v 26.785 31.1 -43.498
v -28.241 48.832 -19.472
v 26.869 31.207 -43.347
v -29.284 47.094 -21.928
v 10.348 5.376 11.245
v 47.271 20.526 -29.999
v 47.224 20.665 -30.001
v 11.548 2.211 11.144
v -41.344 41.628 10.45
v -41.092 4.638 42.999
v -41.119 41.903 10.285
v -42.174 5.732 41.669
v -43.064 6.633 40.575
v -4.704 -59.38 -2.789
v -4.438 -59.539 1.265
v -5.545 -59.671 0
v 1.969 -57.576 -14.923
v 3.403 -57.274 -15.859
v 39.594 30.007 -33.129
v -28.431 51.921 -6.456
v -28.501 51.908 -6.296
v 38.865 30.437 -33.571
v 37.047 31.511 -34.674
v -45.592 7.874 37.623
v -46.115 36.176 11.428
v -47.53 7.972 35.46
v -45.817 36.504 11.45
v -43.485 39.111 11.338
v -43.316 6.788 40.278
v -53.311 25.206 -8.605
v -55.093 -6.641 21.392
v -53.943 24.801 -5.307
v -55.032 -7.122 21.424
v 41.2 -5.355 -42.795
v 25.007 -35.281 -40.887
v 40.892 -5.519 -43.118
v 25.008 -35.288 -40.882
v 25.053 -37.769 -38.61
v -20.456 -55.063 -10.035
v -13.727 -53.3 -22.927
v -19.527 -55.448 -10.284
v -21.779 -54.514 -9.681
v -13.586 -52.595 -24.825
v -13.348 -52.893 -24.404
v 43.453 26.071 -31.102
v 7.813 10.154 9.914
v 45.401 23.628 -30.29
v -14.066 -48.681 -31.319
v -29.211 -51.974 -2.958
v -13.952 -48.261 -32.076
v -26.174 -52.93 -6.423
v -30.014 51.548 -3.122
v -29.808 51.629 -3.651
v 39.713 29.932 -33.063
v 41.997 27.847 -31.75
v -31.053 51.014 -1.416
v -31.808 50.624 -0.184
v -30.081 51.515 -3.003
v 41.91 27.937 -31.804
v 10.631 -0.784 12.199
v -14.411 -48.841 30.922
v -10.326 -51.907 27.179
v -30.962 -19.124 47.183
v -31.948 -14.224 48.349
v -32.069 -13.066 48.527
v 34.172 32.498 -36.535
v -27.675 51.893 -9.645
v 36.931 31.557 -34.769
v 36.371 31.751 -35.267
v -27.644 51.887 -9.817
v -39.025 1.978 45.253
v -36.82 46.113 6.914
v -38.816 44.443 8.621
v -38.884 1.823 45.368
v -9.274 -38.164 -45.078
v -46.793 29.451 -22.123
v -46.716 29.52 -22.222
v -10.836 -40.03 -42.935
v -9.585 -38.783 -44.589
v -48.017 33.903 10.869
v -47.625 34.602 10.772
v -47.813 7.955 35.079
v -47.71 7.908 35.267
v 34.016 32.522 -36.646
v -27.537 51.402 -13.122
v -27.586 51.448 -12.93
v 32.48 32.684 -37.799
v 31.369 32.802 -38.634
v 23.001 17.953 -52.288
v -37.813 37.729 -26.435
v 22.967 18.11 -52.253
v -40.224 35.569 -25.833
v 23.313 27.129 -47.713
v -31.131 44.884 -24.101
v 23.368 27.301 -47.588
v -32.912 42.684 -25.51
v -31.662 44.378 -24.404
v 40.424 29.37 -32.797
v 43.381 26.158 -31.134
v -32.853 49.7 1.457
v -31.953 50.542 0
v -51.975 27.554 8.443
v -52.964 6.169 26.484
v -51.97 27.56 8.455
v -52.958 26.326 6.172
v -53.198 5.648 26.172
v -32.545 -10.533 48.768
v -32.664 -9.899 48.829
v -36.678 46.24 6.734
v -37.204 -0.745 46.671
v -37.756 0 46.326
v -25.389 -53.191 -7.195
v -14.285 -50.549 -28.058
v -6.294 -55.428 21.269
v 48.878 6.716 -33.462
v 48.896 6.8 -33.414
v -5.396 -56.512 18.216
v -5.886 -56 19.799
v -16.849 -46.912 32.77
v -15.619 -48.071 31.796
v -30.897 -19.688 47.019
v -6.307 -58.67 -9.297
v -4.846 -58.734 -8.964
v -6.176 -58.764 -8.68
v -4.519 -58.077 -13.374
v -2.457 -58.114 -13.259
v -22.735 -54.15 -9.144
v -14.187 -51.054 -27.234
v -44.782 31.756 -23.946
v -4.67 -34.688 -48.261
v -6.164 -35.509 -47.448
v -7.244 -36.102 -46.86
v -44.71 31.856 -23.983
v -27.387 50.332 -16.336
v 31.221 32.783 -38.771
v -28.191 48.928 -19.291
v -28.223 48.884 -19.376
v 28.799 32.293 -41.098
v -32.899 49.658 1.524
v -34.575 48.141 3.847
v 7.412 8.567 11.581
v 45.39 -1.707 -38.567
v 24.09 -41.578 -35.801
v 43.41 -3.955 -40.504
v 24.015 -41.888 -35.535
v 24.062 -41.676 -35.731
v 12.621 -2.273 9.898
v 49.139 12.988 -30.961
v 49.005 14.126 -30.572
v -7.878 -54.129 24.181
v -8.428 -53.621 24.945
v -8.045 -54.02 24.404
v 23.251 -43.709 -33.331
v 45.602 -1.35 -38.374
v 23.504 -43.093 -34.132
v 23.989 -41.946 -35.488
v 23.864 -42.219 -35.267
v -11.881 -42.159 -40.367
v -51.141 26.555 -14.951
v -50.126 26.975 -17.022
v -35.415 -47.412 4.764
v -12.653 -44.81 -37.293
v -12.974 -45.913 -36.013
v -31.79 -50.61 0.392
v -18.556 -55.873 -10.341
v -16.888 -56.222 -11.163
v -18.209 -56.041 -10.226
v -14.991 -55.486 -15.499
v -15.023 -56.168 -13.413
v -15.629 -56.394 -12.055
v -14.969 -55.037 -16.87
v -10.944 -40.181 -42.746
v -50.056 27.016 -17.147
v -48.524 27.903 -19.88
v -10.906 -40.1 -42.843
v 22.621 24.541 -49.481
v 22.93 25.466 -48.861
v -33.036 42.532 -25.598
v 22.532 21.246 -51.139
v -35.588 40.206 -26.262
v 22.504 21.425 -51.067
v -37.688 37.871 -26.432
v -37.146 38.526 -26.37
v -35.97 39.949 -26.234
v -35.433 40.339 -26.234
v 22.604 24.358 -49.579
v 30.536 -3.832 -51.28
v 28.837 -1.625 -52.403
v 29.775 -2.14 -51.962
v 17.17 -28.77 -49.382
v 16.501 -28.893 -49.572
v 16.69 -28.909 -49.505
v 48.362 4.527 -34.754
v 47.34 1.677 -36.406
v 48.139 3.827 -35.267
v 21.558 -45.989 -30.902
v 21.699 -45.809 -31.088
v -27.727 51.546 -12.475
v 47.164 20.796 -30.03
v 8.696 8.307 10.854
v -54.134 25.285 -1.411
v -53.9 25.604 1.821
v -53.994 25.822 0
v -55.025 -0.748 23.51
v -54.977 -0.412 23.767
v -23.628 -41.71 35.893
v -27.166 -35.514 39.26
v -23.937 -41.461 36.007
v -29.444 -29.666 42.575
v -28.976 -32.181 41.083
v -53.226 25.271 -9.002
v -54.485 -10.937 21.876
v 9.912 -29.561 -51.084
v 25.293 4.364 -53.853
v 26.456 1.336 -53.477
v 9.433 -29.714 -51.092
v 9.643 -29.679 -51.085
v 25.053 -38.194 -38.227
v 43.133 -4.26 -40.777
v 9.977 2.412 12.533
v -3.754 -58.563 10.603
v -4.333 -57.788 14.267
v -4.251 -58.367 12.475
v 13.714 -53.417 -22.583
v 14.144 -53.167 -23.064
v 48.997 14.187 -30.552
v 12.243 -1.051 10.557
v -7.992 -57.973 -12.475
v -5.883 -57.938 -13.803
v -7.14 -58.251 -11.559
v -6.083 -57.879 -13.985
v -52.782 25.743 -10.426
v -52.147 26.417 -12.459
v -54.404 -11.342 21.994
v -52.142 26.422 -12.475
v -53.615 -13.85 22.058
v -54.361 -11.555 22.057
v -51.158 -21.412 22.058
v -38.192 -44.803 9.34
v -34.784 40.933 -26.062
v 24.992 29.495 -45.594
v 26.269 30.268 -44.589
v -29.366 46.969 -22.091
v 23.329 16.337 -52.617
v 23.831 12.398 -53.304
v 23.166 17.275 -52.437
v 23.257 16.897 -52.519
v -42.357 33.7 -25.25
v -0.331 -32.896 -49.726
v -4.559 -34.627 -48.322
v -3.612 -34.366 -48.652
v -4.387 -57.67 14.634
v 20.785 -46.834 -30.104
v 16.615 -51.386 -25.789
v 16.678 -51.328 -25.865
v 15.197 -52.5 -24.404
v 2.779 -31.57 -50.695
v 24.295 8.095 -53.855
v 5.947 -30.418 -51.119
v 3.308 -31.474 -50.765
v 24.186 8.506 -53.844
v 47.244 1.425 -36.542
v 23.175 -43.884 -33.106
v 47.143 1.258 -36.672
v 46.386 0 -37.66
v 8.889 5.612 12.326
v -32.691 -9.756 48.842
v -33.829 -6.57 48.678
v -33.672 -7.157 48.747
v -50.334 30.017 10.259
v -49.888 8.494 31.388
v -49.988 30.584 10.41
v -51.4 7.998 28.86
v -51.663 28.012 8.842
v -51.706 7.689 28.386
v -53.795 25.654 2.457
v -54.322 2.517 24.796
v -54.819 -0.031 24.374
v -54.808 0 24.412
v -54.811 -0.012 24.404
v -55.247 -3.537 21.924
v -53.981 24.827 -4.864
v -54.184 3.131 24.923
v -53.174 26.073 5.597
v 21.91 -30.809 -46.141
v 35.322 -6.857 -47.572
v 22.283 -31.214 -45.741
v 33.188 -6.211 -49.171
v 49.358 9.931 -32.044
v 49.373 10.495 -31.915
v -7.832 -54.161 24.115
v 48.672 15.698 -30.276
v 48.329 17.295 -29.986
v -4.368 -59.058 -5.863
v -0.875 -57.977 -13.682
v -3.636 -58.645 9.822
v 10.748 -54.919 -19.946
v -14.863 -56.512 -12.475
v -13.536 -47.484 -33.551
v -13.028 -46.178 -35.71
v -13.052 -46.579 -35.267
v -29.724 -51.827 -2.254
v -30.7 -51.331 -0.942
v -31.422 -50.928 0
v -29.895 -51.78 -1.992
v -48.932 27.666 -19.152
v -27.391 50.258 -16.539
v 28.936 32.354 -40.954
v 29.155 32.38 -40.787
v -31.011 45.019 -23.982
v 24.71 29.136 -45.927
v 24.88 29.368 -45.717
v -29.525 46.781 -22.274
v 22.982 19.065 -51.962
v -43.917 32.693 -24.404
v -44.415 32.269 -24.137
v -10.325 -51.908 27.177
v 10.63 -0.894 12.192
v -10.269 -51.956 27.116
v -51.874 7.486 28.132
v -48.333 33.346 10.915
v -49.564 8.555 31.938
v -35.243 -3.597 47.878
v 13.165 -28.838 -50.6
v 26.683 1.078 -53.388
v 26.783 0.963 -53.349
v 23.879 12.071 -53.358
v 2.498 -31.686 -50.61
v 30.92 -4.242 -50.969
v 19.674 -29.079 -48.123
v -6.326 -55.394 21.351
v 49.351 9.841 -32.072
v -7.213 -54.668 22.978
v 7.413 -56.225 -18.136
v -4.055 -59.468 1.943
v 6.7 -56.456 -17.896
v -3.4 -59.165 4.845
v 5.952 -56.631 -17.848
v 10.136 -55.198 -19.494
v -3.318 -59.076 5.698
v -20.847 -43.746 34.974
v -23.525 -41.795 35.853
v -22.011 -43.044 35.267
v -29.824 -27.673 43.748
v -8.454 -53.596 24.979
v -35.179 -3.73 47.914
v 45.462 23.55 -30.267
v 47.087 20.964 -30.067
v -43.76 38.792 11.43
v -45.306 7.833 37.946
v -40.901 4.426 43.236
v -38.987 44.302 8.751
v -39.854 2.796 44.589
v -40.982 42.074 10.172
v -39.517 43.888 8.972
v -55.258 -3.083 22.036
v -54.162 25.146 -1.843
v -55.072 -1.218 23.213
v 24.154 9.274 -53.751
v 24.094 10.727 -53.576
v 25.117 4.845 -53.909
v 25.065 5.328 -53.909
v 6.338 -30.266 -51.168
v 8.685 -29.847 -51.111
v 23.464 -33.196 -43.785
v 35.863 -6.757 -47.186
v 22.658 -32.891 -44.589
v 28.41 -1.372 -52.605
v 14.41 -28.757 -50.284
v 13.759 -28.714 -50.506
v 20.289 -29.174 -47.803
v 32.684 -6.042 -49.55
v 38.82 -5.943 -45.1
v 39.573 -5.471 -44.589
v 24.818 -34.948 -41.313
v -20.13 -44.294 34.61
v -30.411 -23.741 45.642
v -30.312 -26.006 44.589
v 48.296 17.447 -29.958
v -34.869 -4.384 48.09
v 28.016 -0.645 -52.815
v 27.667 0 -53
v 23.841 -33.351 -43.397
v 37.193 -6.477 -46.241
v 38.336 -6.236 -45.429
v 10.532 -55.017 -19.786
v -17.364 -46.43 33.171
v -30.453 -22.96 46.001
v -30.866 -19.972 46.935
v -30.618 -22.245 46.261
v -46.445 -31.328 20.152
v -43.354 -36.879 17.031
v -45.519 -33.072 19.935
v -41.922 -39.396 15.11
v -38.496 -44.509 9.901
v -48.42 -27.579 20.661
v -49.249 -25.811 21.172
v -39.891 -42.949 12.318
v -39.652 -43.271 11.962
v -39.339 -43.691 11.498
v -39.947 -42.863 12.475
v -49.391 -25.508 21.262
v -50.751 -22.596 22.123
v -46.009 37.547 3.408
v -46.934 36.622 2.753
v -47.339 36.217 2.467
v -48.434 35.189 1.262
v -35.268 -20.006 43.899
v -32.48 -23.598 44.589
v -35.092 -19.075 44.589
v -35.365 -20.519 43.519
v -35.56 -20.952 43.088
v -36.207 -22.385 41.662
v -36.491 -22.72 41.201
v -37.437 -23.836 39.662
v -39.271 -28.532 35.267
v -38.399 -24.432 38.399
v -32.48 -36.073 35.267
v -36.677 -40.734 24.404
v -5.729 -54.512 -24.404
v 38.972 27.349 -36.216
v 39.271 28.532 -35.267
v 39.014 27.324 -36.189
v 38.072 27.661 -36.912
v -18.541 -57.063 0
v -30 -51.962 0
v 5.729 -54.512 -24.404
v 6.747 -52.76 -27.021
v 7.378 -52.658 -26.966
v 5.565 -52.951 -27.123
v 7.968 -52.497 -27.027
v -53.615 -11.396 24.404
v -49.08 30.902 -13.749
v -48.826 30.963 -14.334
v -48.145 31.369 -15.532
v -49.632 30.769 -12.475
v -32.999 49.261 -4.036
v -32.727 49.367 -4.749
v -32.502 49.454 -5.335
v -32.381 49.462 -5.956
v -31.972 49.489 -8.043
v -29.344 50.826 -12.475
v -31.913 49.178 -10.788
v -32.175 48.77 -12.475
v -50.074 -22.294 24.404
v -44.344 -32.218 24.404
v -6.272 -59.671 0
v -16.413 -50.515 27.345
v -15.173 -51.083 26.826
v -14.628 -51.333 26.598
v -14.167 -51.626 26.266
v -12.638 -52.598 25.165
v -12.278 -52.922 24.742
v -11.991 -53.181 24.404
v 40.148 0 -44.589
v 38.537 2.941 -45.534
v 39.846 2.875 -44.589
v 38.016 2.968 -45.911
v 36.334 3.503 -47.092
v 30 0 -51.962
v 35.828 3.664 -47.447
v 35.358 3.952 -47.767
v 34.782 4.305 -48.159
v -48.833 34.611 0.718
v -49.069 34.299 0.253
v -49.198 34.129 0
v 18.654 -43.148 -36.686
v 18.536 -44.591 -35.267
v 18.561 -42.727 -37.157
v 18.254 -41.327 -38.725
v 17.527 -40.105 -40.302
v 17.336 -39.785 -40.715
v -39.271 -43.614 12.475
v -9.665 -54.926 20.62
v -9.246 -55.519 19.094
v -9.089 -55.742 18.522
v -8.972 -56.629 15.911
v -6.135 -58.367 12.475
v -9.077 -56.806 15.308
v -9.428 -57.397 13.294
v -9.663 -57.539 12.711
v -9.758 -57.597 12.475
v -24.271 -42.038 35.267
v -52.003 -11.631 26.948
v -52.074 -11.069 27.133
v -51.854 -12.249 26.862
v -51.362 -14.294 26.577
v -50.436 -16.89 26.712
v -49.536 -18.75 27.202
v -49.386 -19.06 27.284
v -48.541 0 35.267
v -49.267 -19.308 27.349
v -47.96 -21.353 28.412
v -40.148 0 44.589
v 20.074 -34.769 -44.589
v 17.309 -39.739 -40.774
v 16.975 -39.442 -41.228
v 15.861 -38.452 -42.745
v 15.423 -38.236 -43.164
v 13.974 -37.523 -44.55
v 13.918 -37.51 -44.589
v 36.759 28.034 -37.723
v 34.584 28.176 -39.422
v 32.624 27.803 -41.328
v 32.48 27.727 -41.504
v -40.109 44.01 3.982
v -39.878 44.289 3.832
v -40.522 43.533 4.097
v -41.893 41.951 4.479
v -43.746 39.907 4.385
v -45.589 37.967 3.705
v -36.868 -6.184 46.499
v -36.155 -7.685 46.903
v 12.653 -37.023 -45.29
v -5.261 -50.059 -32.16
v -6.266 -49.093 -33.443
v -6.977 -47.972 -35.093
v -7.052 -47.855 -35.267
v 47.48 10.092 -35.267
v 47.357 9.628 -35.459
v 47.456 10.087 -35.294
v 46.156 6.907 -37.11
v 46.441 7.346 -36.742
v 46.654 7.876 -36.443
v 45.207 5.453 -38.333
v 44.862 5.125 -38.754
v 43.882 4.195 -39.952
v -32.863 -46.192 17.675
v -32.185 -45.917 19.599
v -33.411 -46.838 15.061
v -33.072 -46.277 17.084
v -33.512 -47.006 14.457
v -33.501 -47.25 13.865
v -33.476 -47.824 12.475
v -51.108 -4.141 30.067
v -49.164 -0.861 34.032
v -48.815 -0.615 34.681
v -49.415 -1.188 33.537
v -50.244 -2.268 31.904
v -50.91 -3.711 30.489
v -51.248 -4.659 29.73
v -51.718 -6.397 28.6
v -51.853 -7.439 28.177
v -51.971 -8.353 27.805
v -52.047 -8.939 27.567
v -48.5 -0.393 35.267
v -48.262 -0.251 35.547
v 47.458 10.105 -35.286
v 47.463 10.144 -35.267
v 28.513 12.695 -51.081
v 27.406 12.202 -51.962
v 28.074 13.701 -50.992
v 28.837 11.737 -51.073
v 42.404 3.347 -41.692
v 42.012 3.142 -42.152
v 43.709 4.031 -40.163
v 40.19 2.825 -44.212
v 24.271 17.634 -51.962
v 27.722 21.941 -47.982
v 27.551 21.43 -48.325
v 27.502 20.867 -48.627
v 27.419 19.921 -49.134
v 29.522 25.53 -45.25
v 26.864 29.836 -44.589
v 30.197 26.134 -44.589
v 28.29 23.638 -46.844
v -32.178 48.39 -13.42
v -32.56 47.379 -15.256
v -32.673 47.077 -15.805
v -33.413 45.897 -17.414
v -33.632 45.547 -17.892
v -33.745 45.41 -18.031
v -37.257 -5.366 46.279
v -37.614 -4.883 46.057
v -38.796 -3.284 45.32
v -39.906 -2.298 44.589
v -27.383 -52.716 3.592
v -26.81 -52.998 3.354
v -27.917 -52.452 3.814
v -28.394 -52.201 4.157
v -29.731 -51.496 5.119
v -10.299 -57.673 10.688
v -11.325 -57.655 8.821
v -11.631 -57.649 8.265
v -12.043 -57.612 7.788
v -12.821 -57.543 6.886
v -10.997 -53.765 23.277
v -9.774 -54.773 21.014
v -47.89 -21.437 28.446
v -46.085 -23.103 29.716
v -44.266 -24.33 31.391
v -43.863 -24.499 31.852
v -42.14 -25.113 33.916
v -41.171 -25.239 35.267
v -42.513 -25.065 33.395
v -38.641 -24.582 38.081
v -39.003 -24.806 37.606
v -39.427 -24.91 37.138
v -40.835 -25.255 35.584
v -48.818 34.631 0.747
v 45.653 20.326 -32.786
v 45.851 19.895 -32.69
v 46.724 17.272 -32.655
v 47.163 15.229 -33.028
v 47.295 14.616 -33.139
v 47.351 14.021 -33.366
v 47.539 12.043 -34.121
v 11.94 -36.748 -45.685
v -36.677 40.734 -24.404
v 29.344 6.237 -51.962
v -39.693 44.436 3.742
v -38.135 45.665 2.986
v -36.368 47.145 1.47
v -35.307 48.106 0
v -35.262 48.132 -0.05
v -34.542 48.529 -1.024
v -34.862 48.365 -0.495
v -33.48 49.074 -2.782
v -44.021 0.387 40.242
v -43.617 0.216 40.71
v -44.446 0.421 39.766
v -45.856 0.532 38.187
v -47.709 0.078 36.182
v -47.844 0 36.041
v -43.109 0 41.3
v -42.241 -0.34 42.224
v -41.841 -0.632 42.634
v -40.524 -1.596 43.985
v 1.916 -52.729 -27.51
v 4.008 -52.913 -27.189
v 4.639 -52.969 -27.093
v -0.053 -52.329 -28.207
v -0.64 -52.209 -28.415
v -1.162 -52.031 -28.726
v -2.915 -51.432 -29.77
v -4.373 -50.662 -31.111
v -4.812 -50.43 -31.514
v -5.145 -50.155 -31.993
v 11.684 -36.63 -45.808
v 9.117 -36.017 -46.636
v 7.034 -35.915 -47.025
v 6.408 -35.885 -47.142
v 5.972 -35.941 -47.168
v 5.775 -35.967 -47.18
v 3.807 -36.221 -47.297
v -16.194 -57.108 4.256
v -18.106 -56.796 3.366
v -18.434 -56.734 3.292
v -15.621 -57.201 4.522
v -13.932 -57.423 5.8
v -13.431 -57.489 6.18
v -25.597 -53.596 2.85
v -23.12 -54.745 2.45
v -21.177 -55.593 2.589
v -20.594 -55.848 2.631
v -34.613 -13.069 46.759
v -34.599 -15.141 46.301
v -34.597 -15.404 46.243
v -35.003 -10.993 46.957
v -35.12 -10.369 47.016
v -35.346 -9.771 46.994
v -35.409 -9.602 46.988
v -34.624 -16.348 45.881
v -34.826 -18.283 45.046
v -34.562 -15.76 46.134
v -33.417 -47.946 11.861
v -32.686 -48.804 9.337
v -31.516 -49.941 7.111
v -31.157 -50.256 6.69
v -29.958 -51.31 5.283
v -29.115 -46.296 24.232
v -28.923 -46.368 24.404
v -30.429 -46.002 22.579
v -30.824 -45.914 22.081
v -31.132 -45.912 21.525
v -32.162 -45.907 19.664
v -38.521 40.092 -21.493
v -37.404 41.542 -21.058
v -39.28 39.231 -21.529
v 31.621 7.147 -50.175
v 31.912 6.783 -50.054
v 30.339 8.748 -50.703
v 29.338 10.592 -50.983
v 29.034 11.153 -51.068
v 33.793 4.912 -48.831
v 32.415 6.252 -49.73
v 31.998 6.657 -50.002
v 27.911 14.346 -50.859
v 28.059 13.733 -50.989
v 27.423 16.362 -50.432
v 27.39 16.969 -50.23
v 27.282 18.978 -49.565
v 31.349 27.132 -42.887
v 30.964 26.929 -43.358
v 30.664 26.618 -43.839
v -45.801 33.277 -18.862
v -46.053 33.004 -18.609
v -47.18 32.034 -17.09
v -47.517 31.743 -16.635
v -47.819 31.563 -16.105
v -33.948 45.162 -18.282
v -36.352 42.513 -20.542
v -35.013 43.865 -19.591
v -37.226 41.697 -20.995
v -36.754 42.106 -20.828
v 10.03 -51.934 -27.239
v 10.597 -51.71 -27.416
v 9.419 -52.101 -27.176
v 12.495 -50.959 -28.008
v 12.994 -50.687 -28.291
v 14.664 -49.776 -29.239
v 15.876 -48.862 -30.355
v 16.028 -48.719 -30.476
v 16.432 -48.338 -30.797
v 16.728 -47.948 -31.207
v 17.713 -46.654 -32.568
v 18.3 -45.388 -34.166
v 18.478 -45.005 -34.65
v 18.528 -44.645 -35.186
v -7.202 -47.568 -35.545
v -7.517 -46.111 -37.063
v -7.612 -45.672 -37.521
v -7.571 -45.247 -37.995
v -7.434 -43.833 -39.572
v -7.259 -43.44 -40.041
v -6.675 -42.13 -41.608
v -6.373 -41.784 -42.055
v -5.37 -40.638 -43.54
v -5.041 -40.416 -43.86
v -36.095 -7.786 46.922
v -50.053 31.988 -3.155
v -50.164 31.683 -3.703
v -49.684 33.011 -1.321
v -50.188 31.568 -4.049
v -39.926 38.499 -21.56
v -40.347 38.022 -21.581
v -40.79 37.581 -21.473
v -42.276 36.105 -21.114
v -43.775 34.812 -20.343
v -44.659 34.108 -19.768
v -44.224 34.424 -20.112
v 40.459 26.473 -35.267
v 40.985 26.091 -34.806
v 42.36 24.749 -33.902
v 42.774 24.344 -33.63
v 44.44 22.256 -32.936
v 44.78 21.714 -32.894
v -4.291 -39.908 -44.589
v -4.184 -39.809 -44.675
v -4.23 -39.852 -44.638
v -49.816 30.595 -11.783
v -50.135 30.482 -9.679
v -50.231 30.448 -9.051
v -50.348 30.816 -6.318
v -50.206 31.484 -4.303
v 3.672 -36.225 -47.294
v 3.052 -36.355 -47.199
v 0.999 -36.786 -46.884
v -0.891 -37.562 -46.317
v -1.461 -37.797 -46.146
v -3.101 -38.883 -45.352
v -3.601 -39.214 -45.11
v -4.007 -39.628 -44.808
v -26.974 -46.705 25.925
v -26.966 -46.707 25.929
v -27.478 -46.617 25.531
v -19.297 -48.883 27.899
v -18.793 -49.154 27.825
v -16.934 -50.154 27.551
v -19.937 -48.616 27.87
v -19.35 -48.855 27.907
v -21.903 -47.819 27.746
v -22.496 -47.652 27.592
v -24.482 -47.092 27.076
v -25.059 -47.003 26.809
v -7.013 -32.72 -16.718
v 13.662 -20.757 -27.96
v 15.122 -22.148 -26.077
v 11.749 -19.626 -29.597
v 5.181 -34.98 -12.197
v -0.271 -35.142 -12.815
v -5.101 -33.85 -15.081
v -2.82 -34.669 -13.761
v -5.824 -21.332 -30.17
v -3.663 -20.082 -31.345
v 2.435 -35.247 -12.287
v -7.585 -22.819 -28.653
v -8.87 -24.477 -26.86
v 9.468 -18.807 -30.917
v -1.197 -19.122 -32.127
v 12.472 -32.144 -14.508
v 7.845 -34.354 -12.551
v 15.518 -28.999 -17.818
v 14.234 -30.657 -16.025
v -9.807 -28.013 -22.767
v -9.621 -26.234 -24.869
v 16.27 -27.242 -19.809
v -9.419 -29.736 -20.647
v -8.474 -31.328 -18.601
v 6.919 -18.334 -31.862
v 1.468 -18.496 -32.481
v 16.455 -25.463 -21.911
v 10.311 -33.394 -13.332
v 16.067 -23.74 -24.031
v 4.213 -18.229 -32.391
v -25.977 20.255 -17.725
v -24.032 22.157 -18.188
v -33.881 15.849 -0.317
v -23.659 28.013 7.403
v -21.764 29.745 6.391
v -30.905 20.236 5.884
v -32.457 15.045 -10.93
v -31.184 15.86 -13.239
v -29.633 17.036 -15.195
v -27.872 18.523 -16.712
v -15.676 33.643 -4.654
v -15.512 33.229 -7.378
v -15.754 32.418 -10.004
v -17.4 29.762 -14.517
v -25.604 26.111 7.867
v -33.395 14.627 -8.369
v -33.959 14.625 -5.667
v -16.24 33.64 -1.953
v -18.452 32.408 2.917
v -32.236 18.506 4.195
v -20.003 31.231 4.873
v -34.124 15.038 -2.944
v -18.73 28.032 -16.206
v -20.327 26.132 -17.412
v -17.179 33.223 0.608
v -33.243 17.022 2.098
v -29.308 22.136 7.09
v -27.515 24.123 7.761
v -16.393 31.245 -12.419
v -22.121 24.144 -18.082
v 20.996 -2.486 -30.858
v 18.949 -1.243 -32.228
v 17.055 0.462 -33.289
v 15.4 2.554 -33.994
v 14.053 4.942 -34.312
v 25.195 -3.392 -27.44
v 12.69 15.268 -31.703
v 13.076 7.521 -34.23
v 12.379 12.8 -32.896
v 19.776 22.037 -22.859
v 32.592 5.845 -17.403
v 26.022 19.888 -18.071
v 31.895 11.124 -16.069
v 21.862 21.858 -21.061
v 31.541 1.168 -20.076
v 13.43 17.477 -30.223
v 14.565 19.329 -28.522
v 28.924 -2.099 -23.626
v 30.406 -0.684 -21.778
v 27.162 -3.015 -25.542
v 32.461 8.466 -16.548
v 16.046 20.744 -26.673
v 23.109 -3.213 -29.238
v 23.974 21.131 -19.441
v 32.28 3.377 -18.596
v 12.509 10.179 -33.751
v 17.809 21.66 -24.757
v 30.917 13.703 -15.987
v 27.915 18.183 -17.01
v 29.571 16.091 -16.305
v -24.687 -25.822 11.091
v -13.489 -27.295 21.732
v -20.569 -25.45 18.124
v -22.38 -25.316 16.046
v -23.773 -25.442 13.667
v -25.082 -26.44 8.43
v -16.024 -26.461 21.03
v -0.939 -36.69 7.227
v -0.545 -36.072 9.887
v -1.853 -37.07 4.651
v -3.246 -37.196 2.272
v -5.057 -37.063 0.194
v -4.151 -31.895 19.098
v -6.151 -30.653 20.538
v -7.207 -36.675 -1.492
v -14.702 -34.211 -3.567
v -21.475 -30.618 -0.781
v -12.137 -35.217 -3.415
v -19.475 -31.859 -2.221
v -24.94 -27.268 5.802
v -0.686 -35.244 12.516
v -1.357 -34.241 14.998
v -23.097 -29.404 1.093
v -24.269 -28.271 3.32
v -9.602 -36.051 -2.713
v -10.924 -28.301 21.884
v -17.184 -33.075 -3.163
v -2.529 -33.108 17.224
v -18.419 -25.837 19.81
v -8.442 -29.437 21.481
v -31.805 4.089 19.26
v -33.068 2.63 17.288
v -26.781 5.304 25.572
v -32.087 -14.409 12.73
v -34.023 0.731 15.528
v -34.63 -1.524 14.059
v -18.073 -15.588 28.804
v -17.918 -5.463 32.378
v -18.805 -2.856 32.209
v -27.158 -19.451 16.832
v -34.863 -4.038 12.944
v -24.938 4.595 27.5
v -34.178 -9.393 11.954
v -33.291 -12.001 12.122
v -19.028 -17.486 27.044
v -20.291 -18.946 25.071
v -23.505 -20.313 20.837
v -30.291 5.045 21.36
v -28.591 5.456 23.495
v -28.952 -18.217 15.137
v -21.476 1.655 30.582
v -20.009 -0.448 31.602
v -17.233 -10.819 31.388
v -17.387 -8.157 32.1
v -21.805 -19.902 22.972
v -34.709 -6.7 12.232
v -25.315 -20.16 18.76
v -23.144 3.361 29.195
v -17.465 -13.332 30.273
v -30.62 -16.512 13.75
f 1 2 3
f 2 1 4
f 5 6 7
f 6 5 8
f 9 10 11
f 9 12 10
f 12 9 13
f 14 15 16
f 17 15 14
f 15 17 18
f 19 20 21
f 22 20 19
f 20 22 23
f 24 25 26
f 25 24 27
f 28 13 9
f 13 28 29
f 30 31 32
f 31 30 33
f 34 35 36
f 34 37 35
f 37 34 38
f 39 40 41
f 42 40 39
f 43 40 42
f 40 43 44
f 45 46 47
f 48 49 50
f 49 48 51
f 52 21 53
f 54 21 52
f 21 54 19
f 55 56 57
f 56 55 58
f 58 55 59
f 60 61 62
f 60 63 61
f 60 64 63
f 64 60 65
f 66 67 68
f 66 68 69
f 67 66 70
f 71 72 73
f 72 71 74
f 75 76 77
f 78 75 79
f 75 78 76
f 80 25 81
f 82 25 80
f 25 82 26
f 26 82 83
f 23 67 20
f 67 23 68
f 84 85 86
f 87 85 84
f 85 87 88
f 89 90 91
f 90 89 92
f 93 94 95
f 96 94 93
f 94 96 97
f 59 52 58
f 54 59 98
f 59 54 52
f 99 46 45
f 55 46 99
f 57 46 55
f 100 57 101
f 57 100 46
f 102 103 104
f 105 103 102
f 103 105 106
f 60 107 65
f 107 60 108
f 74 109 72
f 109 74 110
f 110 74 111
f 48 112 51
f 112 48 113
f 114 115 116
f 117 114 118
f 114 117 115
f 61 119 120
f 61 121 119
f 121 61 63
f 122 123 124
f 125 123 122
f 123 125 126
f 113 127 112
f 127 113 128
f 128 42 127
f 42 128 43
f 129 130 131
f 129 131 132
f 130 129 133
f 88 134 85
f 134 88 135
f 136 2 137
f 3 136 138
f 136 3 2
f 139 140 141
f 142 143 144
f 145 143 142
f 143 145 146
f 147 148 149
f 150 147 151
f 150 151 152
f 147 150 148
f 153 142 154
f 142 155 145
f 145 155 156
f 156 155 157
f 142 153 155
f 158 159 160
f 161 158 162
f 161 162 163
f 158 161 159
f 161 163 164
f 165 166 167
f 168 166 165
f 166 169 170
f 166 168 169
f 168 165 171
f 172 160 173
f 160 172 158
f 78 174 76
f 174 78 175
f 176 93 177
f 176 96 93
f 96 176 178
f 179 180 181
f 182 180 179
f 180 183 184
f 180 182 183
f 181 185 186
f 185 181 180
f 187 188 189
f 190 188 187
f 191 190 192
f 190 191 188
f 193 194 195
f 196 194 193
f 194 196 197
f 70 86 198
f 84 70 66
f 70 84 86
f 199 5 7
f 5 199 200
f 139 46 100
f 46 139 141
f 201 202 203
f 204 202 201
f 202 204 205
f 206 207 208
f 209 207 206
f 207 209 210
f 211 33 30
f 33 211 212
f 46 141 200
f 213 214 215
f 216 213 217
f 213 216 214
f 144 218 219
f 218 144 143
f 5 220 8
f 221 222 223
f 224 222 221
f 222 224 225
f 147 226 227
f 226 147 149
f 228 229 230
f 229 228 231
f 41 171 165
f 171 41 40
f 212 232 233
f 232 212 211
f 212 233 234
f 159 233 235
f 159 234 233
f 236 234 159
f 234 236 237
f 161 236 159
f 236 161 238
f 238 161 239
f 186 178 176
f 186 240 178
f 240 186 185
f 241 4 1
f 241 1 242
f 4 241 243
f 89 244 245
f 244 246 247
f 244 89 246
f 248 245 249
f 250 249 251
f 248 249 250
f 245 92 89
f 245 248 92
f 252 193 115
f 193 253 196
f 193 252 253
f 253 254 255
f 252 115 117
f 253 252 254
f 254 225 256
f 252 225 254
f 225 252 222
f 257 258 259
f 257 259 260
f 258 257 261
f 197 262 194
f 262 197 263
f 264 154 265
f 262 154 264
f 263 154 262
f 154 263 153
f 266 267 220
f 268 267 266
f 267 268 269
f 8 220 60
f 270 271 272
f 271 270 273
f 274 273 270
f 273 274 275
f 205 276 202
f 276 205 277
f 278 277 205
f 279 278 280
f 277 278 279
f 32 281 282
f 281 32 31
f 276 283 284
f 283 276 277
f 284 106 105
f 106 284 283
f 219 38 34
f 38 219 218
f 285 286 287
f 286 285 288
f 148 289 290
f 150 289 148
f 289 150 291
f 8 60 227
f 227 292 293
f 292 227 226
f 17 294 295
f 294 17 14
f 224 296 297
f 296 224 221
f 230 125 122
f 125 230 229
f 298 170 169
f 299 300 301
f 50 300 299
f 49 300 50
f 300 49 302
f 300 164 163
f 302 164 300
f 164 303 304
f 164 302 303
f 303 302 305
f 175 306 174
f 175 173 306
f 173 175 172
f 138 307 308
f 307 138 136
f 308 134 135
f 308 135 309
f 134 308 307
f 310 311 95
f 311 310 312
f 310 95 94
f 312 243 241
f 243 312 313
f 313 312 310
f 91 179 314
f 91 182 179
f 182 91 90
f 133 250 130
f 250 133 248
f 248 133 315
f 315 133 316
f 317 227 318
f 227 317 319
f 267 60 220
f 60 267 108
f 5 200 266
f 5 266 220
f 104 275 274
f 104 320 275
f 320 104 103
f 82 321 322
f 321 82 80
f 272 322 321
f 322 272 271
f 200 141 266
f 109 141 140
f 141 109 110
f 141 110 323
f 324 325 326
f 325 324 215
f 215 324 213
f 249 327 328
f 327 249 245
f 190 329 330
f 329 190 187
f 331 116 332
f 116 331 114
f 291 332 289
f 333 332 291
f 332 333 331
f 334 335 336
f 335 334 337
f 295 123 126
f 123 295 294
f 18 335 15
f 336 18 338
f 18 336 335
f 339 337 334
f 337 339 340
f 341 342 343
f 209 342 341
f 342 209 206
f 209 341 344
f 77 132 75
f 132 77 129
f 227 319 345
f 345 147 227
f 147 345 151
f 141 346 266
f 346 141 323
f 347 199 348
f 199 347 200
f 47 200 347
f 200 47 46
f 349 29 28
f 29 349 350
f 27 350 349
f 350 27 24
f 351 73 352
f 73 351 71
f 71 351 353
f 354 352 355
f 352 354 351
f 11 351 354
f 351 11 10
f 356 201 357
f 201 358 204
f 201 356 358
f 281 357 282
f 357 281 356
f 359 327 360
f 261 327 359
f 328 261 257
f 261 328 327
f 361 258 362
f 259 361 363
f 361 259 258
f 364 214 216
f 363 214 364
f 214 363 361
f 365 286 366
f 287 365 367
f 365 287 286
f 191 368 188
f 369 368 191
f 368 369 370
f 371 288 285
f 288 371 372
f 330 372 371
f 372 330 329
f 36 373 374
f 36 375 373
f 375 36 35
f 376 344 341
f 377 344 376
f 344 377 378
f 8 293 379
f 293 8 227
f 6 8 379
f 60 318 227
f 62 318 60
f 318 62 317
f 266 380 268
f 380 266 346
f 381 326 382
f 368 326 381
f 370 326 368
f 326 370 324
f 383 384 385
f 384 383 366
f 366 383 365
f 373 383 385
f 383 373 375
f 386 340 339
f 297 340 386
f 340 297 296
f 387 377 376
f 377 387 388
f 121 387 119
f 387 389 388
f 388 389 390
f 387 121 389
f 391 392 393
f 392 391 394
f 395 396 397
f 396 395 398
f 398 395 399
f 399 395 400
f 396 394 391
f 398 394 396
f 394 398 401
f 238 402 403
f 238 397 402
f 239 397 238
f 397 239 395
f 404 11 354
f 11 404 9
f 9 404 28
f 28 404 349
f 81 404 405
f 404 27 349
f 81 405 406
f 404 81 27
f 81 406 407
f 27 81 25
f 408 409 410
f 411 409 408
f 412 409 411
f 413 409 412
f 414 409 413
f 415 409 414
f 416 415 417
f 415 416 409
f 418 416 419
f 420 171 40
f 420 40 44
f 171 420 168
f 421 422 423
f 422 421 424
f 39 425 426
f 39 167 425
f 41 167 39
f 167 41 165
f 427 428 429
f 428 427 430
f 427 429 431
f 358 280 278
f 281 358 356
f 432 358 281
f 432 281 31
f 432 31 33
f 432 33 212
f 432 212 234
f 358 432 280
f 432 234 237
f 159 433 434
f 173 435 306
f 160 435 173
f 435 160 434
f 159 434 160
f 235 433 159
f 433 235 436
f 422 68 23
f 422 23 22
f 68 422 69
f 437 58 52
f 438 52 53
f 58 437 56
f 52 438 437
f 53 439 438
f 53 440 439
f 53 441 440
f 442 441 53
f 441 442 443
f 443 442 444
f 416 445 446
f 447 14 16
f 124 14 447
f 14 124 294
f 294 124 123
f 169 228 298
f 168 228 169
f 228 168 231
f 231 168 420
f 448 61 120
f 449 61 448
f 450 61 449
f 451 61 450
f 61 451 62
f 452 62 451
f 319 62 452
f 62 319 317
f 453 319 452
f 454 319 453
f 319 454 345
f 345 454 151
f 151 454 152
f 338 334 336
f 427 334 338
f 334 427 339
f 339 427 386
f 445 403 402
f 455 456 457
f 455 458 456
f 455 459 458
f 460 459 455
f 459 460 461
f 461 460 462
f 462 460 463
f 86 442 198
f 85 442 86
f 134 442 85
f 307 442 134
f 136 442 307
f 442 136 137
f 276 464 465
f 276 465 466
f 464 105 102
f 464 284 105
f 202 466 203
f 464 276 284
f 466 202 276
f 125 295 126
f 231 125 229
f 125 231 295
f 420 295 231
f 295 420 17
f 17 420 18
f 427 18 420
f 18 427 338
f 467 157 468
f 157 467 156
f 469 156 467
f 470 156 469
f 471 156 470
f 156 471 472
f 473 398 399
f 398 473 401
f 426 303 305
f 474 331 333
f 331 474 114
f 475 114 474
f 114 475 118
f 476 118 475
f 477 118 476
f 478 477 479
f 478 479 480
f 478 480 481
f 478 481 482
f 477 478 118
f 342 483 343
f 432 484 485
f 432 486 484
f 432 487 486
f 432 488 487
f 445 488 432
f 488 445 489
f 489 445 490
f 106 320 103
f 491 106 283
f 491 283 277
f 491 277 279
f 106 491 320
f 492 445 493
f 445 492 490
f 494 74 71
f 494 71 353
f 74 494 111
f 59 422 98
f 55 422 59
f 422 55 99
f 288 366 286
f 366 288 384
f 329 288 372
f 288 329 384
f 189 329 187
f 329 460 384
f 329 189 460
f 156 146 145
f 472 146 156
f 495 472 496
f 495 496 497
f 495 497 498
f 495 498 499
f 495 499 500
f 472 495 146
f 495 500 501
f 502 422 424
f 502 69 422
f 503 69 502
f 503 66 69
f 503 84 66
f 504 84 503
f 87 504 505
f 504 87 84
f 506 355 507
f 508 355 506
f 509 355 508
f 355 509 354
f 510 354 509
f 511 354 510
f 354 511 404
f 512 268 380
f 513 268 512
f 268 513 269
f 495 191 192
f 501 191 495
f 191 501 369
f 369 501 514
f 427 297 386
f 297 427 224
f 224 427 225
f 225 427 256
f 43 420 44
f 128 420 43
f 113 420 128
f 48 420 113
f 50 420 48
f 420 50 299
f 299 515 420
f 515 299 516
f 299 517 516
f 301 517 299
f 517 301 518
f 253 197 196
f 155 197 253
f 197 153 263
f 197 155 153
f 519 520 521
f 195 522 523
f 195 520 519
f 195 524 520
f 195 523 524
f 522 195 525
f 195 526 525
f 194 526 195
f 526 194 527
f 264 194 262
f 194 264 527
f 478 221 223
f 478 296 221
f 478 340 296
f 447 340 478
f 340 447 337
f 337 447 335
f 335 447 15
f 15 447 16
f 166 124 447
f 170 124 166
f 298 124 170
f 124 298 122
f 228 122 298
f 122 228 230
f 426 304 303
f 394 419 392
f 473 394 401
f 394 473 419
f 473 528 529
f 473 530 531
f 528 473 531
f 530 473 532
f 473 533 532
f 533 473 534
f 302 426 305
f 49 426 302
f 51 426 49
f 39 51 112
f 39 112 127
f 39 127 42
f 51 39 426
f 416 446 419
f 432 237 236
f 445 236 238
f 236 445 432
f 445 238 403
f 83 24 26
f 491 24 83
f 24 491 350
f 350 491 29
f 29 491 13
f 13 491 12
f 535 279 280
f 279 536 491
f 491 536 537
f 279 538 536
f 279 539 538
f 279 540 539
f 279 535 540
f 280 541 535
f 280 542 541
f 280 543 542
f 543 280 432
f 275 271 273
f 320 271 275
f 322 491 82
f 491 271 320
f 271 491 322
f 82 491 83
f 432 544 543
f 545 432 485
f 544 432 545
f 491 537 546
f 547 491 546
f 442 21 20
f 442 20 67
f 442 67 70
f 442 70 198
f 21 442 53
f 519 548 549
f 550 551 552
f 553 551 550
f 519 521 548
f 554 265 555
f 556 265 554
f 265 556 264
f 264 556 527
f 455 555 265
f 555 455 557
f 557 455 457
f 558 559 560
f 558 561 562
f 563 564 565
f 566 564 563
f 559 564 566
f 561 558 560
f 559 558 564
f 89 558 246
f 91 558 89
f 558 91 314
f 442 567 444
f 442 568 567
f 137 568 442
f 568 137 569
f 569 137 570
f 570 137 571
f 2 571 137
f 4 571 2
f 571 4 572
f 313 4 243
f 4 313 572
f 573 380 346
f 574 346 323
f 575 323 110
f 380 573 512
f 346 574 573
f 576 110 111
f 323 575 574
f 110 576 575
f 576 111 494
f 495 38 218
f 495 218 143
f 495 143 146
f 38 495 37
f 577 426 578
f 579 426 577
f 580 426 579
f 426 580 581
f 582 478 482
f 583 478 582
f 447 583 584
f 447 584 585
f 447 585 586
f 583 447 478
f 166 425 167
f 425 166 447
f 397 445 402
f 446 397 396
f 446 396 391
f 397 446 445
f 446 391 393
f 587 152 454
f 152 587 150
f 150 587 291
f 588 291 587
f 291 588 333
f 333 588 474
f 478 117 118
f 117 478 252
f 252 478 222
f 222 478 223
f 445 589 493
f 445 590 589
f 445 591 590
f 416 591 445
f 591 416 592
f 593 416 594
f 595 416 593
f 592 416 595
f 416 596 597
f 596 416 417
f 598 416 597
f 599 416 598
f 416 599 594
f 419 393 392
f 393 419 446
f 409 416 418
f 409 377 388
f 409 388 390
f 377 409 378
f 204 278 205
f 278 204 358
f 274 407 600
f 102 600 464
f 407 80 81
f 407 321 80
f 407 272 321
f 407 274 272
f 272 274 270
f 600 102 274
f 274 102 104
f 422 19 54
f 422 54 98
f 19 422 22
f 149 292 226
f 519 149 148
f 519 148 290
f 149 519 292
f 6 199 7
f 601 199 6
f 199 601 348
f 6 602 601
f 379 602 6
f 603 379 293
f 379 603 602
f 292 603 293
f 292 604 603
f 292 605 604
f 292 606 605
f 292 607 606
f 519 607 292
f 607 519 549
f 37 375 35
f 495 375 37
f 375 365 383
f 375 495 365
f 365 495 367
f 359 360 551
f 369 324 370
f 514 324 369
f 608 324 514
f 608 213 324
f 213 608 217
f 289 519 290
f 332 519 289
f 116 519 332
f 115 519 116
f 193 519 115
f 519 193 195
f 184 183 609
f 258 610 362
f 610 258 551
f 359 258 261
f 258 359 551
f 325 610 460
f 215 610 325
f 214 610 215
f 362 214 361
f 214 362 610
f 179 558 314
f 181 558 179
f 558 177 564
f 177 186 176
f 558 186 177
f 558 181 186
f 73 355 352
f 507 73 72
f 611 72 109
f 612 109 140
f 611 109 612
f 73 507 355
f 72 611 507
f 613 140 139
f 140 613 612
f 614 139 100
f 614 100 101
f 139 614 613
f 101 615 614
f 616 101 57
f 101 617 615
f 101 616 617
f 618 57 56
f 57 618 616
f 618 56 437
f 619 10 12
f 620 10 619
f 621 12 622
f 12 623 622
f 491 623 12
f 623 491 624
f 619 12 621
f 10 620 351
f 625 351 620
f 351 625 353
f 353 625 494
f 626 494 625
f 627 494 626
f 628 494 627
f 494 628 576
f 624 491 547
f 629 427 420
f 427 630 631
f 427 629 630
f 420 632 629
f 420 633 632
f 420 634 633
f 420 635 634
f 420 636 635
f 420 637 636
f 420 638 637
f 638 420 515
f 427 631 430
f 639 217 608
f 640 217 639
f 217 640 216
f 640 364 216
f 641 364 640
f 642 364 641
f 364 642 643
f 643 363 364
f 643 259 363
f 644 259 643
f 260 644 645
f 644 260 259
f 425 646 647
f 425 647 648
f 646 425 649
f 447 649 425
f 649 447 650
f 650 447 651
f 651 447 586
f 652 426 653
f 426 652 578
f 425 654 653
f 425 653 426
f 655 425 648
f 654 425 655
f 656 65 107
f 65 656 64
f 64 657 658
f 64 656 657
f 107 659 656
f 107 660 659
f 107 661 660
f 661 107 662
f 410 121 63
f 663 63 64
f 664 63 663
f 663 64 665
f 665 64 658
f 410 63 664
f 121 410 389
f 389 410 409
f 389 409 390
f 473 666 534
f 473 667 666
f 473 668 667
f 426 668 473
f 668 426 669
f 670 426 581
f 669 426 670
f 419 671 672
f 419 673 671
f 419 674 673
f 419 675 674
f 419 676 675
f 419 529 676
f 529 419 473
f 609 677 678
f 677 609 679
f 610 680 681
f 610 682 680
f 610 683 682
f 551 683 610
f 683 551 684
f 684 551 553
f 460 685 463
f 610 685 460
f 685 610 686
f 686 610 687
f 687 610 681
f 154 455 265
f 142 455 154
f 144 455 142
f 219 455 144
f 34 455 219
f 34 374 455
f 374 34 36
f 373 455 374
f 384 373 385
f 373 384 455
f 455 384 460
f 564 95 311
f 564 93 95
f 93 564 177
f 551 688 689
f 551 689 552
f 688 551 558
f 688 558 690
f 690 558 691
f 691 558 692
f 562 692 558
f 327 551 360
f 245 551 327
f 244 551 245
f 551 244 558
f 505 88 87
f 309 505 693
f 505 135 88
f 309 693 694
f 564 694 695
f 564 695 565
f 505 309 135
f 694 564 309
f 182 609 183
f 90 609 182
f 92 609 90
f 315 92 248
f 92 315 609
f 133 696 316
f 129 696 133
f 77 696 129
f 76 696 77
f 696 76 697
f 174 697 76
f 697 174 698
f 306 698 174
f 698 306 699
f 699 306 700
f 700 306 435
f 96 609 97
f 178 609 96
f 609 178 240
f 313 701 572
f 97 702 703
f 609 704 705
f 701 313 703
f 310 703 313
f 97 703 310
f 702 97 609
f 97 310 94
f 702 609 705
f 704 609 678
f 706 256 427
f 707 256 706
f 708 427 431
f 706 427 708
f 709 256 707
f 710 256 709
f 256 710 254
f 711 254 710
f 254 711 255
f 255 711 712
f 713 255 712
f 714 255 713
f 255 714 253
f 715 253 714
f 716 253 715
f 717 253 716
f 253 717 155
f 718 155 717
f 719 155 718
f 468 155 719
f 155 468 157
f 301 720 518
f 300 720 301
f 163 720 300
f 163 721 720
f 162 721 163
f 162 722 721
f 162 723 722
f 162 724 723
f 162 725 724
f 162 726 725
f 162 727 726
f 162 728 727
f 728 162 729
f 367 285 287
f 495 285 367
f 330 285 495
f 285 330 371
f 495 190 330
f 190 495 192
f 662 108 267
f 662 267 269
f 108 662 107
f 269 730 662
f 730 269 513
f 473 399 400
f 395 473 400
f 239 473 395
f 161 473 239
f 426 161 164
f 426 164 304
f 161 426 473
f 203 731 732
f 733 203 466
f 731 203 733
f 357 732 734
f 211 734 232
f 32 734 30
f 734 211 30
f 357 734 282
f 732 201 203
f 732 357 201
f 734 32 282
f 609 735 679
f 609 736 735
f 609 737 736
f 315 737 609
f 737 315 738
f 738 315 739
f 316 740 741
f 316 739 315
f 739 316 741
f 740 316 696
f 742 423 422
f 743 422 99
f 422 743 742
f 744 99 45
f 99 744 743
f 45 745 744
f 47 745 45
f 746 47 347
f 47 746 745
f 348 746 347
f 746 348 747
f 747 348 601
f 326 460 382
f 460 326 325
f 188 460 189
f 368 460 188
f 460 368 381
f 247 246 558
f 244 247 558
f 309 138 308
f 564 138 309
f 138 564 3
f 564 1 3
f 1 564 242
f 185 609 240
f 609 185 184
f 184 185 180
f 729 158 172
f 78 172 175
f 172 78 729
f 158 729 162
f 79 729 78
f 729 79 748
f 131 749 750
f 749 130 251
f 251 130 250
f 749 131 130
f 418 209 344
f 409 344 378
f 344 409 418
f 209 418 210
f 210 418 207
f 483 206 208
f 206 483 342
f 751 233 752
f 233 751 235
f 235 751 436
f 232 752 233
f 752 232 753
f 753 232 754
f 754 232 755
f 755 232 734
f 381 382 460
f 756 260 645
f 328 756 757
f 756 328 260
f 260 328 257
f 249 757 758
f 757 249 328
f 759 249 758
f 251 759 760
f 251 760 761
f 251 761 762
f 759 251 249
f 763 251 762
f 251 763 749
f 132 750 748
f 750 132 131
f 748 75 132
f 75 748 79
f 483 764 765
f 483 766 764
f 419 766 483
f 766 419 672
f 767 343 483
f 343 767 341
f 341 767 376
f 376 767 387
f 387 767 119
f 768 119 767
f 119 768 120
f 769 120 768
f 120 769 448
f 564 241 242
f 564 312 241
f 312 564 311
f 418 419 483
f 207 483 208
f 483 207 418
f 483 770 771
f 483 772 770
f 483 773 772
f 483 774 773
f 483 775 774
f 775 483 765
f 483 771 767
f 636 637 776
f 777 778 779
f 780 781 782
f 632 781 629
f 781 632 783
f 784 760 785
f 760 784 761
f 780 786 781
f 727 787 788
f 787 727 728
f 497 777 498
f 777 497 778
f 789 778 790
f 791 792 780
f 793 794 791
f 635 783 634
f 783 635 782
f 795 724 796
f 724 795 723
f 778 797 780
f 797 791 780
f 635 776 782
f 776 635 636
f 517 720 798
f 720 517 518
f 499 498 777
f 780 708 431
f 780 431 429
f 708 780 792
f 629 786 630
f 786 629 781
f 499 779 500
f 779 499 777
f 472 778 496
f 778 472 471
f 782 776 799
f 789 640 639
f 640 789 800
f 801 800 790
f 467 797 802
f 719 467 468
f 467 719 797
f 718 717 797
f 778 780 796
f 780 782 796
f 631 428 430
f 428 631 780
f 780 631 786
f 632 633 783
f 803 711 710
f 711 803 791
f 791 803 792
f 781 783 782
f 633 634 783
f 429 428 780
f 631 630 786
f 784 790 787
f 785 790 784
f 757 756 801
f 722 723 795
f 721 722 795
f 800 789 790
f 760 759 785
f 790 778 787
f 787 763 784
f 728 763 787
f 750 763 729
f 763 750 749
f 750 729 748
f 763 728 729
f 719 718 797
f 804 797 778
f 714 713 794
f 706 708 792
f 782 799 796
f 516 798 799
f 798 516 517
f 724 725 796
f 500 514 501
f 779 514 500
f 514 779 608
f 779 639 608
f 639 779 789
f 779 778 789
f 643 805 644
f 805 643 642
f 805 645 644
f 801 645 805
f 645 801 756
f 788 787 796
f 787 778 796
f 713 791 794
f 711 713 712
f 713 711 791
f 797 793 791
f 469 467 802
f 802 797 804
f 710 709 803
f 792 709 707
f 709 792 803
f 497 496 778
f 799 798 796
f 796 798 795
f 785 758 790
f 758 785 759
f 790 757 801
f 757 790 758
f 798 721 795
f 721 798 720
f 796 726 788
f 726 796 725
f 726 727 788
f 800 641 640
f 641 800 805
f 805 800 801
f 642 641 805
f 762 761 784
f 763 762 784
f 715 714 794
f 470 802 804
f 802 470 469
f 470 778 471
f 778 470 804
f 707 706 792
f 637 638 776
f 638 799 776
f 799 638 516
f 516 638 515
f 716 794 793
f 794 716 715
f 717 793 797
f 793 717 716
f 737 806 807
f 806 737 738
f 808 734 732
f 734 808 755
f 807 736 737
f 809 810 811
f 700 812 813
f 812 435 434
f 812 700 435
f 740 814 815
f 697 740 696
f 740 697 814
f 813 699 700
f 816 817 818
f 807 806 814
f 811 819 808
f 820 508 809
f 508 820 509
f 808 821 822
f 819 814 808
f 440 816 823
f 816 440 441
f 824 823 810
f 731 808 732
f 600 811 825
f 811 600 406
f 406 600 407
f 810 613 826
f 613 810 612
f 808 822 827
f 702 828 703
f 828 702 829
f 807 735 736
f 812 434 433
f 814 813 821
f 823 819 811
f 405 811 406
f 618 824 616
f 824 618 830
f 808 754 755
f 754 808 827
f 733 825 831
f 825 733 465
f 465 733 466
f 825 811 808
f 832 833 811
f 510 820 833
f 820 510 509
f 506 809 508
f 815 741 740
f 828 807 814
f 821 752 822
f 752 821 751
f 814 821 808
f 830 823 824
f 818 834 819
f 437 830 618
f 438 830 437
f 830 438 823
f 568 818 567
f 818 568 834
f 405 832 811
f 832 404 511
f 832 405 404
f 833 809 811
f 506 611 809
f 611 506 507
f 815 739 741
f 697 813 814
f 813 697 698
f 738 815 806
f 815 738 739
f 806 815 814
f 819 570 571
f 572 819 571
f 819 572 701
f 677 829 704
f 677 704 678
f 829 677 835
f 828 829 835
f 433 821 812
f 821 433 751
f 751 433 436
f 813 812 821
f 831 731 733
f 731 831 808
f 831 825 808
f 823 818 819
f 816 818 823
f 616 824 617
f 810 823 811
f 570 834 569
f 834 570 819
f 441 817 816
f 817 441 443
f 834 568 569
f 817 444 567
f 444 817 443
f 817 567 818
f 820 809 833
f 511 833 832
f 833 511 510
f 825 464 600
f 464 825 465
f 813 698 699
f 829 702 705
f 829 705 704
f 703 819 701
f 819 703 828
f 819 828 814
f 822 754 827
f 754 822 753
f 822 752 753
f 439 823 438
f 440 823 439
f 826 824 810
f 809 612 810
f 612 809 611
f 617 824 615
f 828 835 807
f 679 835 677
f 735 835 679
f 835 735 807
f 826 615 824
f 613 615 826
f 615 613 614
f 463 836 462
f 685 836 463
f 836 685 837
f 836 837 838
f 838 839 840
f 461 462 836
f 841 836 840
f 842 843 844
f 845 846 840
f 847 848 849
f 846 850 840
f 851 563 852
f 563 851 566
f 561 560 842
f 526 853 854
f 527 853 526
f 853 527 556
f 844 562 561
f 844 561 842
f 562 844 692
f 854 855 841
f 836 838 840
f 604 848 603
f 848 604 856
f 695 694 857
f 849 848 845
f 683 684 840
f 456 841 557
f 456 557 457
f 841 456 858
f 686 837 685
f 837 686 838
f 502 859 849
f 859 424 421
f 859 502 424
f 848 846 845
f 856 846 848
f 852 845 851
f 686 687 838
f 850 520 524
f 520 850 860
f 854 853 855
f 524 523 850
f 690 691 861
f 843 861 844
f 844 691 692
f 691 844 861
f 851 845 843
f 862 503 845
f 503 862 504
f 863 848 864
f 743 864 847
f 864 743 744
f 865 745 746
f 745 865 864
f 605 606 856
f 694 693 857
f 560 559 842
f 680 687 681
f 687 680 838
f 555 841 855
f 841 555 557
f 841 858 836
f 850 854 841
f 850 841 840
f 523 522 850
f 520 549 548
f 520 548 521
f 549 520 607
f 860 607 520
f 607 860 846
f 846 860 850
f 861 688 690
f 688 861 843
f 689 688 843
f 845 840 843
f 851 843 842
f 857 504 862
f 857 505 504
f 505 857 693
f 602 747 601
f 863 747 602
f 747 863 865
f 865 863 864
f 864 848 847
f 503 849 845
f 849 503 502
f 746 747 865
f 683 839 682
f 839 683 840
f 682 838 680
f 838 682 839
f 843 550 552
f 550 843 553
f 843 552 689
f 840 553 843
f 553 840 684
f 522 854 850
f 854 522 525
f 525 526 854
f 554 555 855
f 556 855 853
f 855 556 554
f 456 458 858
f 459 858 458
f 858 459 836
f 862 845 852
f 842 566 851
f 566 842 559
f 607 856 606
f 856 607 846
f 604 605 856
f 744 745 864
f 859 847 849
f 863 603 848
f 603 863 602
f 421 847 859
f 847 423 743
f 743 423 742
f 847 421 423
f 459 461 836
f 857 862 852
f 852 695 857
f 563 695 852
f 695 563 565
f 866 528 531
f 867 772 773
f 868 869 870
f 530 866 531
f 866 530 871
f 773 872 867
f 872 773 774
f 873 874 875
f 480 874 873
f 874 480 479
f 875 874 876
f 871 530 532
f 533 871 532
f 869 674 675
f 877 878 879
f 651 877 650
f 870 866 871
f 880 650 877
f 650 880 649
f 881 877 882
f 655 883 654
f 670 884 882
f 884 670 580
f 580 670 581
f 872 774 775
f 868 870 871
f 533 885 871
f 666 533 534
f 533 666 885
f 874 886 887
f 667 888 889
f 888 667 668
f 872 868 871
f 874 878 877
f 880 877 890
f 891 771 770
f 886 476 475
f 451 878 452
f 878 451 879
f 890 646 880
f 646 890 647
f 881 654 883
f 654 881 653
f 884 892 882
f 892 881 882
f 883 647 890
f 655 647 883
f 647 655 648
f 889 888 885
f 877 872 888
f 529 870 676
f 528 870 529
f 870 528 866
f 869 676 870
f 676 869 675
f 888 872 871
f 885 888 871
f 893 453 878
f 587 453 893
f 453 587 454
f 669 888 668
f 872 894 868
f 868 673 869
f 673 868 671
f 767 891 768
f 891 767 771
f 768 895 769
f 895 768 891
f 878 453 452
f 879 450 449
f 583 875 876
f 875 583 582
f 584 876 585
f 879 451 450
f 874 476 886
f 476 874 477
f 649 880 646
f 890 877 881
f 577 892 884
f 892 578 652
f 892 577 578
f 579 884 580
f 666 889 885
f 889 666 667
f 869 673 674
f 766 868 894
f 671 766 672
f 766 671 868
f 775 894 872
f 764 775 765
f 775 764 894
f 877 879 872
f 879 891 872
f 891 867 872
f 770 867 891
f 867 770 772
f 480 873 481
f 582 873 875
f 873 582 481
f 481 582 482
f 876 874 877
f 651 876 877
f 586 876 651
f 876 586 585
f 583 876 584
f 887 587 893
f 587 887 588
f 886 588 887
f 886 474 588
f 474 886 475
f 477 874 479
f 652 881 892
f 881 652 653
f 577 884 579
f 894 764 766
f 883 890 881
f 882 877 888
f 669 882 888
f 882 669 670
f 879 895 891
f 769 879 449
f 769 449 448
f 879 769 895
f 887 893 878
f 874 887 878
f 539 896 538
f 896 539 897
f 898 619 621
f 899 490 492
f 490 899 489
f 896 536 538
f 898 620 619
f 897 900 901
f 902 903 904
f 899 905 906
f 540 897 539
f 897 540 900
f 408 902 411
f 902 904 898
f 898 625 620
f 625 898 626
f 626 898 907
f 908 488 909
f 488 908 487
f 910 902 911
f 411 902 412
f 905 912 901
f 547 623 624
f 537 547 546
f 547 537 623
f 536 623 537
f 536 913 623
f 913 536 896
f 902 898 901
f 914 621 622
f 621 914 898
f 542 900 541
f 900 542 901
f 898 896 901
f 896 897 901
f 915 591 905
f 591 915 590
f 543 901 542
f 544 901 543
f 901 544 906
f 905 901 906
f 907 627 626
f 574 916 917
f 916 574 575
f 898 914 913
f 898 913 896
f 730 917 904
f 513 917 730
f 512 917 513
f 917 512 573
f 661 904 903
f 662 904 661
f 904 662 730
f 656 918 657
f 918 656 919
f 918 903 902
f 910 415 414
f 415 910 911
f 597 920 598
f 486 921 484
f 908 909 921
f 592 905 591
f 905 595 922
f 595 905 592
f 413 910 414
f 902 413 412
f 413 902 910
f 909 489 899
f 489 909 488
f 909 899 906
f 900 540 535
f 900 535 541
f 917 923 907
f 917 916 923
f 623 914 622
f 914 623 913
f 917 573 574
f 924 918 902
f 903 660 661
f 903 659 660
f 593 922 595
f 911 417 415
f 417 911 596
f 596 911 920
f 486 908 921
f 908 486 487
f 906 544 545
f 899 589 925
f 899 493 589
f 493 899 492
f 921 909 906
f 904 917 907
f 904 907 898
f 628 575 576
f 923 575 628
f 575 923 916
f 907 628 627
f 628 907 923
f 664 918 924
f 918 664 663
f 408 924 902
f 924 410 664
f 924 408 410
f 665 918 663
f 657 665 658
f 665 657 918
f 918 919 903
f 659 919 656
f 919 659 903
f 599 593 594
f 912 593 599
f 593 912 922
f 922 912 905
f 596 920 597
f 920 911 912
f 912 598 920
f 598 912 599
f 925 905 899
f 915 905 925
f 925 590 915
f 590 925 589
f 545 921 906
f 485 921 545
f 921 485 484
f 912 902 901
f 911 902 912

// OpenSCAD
difference() {
	intersection() {
		hull() {
			rotate(a = -123.3588517168, v = [0.5387586807, -0.6382553827, 0.0000000000]) {
				rotate(a = -90.0000000000, v = [-0.0000000000, -1.0000000000, 0.0000000000]) {
					cylinder(h = 60, r = 16.2000000000);
				}
			}
			rotate(a = -123.3588517168, v = [0.5387586807, -0.6382553827, 0.0000000000]) {
				rotate(a = -90.0000000000, v = [0.8660254038, 0.5000000000, -0.0000000000]) {
					cylinder(h = 60, r = 16.2000000000);
				}
			}
			rotate(a = -123.3588517168, v = [0.5387586807, -0.6382553827, 0.0000000000]) {
				rotate(a = -18.4383929552, v = [-0.0090619990, -0.3161549461, 0.0000000000]) {
					cylinder(h = 60, r = 16.2000000000);
				}
			}
			rotate(a = -123.3588517168, v = [0.5387586807, -0.6382553827, 0.0000000000]) {
				rotate(a = -149.1684967374, v = [-0.1784688415, -0.4804378981, 0.0000000000]) {
					cylinder(h = 60, r = 16.2000000000);
				}
			}
			rotate(a = -123.3588517168, v = [0.5387586807, -0.6382553827, 0.0000000000]) {
				rotate(a = -159.6517266695, v = [0.1519712042, 0.3127585874, -0.0000000000]) {
					cylinder(h = 60, r = 16.2000000000);
				}
			}
		}
		sphere(r = 60);
	}
	union() {
		rotate(a = -123.3588517168, v = [0.5387586807, -0.6382553827, 0.0000000000]) {
			rotate(a = -90.0000000000, v = [-0.0000000000, -1.0000000000, 0.0000000000]) {
				translate(v = [0, 0, 35]) {
					cylinder(h = 100, r = 13.2000000000);
				}
			}
		}
		rotate(a = -123.3588517168, v = [0.5387586807, -0.6382553827, 0.0000000000]) {
			rotate(a = -90.0000000000, v = [0.8660254038, 0.5000000000, -0.0000000000]) {
				translate(v = [0, 0, 35]) {
					cylinder(h = 100, r = 13.2000000000);
				}
			}
		}
		rotate(a = -123.3588517168, v = [0.5387586807, -0.6382553827, 0.0000000000]) {
			rotate(a = -18.4383929552, v = [-0.0090619990, -0.3161549461, 0.0000000000]) {
				translate(v = [0, 0, 35]) {
					cylinder(h = 100, r = 13.2000000000);
				}
			}
		}
		rotate(a = -123.3588517168, v = [0.5387586807, -0.6382553827, 0.0000000000]) {
			rotate(a = -149.1684967374, v = [-0.1784688415, -0.4804378981, 0.0000000000]) {
				translate(v = [0, 0, 35]) {
					cylinder(h = 100, r = 13.2000000000);
				}
			}
		}
		rotate(a = -123.3588517168, v = [0.5387586807, -0.6382553827, 0.0000000000]) {
			rotate(a = -159.6517266695, v = [0.1519712042, 0.3127585874, -0.0000000000]) {
				translate(v = [0, 0, 35]) {
					cylinder(h = 100, r = 13.2000000000);
				}
			}
		}
	}
}
